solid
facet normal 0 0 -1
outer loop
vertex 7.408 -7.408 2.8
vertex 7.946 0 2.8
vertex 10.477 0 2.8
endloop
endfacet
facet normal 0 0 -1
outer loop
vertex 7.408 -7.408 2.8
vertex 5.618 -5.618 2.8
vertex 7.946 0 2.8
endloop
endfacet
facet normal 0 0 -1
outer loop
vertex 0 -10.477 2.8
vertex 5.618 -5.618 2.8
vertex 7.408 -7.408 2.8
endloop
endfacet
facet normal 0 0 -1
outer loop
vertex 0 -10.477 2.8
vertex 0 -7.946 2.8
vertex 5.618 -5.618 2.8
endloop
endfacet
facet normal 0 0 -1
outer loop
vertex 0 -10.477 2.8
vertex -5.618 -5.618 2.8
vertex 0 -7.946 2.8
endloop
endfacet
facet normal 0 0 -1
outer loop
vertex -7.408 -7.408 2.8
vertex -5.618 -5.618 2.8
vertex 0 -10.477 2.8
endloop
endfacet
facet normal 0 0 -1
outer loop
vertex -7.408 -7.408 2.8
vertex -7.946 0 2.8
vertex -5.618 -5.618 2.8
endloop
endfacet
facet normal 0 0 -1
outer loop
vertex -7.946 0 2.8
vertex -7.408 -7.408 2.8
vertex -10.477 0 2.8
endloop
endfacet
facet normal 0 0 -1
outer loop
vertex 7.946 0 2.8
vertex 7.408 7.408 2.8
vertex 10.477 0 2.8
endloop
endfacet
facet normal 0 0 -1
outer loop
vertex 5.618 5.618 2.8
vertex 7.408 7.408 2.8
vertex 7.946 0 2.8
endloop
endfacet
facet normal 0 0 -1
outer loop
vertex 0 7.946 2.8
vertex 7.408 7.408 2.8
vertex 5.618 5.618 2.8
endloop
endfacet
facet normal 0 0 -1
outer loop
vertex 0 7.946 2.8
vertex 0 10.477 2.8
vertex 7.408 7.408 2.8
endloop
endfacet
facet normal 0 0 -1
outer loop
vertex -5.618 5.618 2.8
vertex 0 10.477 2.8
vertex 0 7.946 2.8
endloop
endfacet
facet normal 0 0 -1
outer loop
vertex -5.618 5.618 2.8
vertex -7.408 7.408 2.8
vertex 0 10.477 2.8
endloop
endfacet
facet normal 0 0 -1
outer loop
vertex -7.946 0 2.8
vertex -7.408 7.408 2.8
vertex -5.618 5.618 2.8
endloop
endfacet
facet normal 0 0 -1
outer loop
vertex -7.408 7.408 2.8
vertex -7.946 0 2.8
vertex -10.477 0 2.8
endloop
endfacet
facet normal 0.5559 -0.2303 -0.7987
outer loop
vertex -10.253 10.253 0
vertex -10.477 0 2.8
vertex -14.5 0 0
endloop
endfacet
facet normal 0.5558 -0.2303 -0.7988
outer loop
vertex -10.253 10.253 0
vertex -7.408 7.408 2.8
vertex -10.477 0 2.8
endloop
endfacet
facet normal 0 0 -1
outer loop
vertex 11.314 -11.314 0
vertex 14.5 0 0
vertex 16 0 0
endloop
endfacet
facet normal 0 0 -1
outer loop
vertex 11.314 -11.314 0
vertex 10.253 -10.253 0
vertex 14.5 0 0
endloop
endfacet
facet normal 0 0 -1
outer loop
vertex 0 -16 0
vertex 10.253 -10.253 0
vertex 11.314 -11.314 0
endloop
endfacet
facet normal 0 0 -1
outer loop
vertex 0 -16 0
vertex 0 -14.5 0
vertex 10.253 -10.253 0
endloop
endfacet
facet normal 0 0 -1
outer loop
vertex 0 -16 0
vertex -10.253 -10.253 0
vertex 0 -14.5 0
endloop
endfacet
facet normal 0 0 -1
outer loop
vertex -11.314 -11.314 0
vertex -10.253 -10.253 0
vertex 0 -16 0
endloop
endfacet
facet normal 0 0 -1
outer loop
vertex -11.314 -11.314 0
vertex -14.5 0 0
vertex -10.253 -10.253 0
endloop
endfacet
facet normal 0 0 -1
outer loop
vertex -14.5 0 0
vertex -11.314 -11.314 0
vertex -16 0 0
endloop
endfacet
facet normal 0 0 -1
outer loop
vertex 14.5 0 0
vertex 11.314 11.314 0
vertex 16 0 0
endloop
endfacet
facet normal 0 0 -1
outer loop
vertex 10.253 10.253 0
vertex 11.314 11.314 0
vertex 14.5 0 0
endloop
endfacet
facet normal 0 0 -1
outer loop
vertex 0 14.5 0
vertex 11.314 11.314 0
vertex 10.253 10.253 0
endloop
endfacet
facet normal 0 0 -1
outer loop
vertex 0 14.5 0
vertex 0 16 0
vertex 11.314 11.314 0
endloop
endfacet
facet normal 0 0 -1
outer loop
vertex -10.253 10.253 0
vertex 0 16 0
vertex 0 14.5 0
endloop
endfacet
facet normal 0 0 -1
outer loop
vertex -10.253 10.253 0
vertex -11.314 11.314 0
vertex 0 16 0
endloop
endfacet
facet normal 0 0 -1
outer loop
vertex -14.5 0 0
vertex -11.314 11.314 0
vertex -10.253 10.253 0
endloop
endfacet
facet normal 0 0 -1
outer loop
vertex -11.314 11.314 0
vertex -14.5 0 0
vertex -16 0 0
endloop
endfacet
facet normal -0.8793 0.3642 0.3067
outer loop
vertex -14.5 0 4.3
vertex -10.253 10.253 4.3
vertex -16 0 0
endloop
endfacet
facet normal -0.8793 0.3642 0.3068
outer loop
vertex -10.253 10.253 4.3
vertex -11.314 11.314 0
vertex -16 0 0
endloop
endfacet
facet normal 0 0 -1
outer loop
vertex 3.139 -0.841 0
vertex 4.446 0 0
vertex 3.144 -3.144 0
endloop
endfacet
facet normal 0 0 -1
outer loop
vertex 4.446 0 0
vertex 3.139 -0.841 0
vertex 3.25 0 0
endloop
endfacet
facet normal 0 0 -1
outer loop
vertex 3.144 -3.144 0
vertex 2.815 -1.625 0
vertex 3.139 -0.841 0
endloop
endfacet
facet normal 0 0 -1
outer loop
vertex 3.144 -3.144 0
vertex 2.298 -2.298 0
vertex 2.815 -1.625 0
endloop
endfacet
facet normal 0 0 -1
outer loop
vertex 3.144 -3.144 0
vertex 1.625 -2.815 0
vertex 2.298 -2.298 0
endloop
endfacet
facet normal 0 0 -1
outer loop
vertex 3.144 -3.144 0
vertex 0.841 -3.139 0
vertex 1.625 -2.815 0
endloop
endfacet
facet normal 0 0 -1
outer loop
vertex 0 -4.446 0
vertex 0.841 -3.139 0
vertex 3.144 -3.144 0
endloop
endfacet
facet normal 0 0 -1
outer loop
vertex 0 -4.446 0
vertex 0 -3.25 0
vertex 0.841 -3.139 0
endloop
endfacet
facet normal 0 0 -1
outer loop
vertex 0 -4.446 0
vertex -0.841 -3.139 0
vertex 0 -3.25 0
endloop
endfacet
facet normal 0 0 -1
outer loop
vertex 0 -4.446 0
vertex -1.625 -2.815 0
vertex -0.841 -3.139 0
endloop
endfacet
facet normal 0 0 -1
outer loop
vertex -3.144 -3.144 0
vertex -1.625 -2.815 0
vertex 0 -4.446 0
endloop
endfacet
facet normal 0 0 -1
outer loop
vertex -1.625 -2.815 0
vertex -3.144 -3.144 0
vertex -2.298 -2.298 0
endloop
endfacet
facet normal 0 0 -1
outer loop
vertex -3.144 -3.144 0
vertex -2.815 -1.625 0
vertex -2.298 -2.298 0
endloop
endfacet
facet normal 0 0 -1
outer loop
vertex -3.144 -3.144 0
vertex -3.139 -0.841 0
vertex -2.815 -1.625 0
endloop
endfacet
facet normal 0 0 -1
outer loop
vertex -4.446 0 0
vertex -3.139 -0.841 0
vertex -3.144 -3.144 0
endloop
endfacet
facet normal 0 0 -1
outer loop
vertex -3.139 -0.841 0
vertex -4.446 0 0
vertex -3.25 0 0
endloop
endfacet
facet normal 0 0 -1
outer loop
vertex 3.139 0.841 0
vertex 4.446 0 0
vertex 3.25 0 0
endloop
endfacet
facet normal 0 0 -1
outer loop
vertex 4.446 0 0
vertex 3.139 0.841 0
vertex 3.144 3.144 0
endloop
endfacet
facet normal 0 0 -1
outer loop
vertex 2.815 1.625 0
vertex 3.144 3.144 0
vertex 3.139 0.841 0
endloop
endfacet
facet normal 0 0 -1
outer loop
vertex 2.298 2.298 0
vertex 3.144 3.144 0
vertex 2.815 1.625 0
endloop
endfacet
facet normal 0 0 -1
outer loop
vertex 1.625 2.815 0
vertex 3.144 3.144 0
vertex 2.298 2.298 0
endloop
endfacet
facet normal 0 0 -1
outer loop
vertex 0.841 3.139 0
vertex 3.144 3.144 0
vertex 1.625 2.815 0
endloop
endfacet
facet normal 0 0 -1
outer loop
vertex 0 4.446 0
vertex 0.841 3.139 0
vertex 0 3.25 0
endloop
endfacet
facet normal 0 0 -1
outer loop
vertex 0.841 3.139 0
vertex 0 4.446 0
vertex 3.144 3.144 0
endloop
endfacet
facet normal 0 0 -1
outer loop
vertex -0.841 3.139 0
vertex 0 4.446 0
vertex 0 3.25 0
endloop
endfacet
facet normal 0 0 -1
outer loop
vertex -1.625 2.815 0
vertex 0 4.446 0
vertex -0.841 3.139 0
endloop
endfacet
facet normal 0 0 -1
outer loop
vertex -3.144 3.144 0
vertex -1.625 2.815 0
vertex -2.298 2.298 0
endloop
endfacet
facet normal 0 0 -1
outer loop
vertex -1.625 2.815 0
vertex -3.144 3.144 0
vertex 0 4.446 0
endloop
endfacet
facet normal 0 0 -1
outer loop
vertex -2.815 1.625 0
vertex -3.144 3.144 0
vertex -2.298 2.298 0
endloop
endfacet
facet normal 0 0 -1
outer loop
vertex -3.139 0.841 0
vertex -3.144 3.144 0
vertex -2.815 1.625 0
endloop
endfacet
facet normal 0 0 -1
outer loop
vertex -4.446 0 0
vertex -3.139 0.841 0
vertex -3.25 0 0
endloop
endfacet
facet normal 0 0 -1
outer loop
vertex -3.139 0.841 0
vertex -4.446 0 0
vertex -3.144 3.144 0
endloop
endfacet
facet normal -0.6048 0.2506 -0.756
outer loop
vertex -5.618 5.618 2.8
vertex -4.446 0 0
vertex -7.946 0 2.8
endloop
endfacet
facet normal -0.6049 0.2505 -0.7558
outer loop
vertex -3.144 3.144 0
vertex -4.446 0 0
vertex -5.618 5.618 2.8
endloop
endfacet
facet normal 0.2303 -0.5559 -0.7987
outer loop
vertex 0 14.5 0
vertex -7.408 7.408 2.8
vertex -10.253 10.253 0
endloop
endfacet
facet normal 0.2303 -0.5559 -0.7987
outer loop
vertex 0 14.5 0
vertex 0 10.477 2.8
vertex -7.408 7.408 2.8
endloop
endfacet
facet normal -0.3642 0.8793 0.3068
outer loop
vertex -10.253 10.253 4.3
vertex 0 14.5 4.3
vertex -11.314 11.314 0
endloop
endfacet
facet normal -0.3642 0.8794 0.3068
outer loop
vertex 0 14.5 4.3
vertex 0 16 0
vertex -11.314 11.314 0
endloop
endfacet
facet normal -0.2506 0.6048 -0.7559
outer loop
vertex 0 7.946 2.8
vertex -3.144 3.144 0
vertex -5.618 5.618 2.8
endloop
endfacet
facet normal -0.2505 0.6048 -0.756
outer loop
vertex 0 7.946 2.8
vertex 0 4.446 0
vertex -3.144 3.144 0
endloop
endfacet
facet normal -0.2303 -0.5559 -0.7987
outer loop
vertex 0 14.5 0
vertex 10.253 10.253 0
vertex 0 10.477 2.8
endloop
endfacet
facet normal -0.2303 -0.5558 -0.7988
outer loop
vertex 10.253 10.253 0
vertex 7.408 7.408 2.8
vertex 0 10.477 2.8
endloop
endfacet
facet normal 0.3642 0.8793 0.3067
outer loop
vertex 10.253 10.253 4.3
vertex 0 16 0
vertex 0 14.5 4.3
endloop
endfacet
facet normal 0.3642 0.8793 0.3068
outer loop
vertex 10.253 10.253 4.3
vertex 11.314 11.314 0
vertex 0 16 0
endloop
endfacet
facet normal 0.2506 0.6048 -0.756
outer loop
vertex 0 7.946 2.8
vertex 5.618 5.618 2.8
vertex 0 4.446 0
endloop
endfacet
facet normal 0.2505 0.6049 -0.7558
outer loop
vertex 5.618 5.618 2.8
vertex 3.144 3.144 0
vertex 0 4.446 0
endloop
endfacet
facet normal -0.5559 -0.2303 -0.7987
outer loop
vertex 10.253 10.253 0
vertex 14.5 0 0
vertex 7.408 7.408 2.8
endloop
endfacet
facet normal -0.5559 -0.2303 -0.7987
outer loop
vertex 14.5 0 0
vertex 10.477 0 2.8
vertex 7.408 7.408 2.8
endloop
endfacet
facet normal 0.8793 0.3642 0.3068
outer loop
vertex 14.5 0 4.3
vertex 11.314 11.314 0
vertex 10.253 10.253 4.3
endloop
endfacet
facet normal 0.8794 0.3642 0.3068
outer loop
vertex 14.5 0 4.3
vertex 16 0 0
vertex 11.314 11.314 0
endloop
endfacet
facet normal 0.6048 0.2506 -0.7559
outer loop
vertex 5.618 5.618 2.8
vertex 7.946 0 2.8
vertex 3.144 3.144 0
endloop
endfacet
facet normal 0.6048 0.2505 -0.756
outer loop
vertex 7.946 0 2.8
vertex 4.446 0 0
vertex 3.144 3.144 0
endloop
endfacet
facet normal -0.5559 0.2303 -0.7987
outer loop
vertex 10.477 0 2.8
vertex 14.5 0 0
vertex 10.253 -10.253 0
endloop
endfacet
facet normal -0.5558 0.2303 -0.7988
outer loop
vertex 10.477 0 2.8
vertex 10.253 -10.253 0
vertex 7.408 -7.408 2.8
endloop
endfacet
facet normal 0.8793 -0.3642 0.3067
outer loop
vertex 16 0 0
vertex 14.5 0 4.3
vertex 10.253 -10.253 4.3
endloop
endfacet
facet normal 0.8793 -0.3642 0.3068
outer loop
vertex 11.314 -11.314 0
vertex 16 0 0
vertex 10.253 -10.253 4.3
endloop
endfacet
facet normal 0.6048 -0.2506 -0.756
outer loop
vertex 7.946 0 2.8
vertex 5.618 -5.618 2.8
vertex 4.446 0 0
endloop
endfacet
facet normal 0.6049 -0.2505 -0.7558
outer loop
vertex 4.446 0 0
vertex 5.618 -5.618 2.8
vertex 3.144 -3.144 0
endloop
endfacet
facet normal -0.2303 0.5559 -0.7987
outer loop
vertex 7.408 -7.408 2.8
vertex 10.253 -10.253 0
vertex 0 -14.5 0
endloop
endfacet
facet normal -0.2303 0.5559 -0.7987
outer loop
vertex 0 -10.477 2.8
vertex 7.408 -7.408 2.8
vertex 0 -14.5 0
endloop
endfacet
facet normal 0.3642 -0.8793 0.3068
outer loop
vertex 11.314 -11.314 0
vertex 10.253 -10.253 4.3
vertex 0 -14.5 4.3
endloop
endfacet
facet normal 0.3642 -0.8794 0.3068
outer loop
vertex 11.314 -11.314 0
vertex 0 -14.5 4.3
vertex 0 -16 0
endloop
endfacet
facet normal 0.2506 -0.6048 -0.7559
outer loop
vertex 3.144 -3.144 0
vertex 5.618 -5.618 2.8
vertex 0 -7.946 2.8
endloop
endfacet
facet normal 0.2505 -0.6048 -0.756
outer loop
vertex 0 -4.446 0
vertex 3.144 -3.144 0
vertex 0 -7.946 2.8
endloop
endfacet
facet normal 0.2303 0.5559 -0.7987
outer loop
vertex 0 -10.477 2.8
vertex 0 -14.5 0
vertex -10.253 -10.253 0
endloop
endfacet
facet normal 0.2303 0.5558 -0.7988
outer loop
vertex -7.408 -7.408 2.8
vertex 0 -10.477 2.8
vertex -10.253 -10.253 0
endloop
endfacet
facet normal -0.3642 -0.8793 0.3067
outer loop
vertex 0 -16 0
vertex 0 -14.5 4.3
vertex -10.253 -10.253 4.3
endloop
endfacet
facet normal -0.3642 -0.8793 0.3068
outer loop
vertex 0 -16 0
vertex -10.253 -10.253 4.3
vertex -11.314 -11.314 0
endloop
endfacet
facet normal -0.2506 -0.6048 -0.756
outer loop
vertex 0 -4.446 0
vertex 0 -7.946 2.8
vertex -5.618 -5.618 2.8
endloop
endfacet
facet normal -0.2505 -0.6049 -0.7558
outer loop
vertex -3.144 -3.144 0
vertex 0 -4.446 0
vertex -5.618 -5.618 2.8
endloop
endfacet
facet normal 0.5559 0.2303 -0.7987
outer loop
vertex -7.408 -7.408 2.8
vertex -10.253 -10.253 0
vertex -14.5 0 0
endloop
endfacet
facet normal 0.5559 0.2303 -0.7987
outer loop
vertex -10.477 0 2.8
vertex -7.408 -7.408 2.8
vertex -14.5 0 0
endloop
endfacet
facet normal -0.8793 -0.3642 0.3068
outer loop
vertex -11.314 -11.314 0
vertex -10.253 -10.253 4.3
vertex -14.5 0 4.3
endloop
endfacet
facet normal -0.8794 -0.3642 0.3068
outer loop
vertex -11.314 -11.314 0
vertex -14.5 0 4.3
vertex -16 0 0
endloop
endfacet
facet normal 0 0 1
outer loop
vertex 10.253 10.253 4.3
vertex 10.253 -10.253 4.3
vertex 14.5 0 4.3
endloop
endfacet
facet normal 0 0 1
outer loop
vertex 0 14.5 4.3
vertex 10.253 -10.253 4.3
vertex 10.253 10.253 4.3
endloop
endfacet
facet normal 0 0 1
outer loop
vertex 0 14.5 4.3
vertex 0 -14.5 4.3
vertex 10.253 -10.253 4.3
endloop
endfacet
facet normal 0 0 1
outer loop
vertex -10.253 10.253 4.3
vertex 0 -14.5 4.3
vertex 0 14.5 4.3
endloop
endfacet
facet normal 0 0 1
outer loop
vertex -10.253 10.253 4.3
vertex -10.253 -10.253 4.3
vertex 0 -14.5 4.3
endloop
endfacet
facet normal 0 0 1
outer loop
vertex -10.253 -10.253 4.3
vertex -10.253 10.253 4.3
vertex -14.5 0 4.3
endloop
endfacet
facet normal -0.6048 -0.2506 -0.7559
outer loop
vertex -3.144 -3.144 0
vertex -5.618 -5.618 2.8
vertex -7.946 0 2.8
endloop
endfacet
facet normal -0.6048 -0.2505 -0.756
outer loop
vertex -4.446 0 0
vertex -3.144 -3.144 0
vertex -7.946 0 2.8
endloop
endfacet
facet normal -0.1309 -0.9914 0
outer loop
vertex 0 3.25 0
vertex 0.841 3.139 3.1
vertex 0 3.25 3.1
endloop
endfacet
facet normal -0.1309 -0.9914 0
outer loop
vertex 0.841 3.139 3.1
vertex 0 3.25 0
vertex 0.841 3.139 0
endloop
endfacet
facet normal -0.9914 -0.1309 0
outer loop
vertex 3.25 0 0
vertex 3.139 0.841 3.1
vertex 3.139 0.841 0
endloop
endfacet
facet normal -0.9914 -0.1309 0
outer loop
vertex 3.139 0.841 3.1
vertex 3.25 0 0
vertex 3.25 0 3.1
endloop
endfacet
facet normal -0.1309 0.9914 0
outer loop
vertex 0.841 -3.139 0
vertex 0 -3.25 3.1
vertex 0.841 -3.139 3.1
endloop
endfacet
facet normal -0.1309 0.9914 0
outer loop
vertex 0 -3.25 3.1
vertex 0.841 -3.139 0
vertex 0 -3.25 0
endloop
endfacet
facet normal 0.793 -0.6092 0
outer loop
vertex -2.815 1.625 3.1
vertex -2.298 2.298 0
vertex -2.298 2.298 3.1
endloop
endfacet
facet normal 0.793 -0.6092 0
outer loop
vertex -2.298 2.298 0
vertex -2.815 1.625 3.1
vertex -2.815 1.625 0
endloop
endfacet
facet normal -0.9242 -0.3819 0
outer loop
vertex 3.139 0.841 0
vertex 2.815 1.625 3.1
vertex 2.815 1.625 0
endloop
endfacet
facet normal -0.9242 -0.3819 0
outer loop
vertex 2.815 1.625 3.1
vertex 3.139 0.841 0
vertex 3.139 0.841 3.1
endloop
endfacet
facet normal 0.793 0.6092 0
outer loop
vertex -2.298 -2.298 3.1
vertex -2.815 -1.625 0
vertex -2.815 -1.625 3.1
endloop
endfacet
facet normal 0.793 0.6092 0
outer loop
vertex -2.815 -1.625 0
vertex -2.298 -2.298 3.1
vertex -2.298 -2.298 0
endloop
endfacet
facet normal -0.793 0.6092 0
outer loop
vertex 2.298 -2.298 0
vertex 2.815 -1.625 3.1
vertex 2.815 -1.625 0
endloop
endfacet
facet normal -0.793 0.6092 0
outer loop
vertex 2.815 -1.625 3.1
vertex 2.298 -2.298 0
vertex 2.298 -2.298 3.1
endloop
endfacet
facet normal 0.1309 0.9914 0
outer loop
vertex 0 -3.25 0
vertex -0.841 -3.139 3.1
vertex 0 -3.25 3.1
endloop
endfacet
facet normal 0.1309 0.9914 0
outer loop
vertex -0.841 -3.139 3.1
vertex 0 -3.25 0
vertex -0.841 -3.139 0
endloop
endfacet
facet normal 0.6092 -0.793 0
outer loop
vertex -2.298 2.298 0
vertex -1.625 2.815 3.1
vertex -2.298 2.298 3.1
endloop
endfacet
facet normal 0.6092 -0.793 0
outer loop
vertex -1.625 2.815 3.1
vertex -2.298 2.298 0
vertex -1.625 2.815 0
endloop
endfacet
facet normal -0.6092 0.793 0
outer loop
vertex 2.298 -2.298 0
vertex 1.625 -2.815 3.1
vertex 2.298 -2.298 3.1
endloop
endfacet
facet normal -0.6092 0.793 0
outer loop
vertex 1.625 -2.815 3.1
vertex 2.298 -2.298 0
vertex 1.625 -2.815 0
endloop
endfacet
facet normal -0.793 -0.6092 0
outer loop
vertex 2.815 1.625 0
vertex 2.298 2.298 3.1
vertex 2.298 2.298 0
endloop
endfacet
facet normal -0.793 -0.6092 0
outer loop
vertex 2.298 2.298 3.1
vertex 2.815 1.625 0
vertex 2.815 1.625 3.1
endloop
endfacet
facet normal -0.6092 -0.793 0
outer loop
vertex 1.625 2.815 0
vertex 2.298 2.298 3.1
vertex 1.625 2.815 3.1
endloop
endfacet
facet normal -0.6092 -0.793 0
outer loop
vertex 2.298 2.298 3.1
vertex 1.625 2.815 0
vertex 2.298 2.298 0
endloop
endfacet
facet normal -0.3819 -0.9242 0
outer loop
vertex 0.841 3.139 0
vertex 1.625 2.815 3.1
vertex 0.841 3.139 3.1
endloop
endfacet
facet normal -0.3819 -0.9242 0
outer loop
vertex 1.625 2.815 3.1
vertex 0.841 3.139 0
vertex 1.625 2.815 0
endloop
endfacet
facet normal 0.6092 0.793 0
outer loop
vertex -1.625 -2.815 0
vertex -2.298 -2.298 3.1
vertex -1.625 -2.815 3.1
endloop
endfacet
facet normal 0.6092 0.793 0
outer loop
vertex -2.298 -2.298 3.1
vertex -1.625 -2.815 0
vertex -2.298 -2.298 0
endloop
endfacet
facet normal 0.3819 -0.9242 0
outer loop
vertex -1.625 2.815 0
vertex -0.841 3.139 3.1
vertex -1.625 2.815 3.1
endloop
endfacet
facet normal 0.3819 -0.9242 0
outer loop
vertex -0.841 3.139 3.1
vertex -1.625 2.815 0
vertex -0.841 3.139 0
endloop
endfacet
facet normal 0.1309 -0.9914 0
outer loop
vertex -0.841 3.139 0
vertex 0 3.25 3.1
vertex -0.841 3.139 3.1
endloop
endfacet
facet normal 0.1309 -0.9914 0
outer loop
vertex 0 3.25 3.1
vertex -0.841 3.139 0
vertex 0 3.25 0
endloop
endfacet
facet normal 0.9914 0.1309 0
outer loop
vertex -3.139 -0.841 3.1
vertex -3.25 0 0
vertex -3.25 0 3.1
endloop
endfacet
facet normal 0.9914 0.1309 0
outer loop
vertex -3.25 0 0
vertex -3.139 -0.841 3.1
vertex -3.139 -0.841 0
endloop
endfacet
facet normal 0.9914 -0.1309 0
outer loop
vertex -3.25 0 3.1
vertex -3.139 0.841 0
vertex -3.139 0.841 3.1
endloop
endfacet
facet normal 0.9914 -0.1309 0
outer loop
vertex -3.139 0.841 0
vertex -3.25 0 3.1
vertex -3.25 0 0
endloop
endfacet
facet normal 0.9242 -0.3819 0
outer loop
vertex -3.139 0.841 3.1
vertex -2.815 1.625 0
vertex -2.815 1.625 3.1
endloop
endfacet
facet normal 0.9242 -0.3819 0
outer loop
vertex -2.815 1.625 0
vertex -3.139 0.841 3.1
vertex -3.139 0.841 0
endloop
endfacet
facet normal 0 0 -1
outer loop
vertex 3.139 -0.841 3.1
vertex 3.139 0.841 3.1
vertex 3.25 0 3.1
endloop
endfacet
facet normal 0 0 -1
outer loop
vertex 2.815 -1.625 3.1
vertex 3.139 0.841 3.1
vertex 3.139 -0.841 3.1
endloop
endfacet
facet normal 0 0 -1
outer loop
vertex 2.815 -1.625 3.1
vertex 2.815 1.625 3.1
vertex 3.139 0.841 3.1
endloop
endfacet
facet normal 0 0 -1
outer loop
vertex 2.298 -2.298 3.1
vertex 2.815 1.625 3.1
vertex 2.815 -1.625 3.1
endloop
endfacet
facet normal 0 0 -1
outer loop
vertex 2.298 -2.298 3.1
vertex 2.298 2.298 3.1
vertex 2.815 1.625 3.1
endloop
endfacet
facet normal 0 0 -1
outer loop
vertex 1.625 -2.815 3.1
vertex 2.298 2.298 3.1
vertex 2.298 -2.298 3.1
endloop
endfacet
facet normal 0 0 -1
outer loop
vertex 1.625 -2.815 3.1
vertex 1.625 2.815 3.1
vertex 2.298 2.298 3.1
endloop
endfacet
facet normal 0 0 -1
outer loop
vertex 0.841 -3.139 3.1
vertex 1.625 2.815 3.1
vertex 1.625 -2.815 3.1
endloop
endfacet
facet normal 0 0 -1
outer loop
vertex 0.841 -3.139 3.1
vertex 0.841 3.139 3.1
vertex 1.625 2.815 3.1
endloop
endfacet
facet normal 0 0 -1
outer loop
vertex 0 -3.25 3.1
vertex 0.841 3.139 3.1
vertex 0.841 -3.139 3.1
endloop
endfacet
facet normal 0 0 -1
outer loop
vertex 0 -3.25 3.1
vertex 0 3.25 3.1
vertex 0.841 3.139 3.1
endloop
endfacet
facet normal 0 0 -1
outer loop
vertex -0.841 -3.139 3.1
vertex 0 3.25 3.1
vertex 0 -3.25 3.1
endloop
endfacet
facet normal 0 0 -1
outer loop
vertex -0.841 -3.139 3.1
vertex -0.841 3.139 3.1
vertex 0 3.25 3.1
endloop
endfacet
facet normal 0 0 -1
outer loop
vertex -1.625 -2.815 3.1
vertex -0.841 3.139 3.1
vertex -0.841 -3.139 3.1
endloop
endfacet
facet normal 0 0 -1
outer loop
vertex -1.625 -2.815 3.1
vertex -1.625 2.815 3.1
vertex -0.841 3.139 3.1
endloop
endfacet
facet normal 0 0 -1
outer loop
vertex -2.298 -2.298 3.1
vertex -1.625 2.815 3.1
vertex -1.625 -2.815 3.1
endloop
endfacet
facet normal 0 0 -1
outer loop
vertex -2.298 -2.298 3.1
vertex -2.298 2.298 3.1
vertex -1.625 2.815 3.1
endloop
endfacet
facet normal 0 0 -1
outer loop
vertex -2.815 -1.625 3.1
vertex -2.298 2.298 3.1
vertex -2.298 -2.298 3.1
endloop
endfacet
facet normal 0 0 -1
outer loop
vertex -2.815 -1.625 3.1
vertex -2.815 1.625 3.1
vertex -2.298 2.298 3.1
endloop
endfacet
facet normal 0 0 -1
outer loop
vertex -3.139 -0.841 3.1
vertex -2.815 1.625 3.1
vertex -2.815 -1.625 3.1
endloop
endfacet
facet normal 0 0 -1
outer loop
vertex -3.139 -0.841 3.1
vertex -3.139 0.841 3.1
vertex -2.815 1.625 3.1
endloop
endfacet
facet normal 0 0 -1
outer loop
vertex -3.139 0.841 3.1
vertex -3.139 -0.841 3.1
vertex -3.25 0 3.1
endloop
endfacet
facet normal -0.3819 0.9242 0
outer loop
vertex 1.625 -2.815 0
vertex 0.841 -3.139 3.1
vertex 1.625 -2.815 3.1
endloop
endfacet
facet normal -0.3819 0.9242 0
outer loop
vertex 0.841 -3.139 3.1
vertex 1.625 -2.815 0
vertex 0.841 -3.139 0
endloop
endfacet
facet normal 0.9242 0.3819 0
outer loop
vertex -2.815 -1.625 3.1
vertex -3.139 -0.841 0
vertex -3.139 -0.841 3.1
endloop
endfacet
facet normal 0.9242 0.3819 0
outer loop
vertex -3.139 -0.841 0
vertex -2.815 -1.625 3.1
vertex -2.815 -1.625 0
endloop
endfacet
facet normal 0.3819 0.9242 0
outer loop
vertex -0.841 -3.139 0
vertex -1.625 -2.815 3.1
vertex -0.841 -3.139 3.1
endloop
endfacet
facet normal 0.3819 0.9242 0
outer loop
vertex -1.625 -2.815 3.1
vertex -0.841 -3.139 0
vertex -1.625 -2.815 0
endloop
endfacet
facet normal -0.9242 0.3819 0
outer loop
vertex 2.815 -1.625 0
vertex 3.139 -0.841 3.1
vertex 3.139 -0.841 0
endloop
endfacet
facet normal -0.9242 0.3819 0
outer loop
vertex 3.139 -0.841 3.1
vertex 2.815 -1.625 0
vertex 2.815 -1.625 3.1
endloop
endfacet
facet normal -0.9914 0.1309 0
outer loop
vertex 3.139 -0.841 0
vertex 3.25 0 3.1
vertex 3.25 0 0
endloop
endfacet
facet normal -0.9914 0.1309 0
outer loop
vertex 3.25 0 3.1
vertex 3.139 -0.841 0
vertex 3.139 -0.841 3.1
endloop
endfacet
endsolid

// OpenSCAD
// file: girl_common.scad
// Copyright 2025 Natalie Baker // Apache v2 //

// // Settings // //

tile_tol   = 0.5; 
base_size  = 32;
base_scale = base_size + 2 - tile_tol;
wall_width =   8;

// // Magnets // //

magnet_dia    = 6.2;
magnet_height = 2.8;

// // Lock // //

lock_height   = 1.9;
lock_depth    = 4.9;
lock_shoulder = 2.0;
lock_width    = 11; 

// // Grid // //

grid_key_width = 1.8;

grid_tile_size =  base_scale + 2*wall_width;
grid_tile_diag   = sqrt(2*grid_tile_size*grid_tile_size);

grid_base_size   = grid_tile_size + tile_tol;
grid_base_diag   = sqrt(2*grid_base_size*grid_base_size);
grid_base_height = max(lock_height, magnet_height)+1.2;

// // Tile // //

tile_height        = grid_base_height;
tile_top_thickness = tile_height-magnet_height;

// // Frame // //

frame_size = lock_depth;

// // Util // //

module mirror_copy(m) {
	mirror(m) children();
	children();	
}

module rotate_copy(a) {
	rotate(a) children();
	children();	
}

module repeat(size, x, y, z, center) {
	off = center 
		? [(x-1)*size[0],(y-1)*size[1],(z-1)*size[2]]/2 
		: [0,0,0];

	for(i = [0 : x-1])
	for(j = [0 : y-1])
	for(k = [0 : z-1])
		translate([
			size[0]*i-off[0],
			size[1]*j-off[1],
			size[2]*k-off[2]
		]) children();
}
// main file
// Copyright 2025 Natalie Baker // Apache v2 //

include<girl_common.scad>;

base_thickness = 1.5;
base_gap       = magnet_height;

base_rad     = base_size/2;
base_rad_top = base_rad - 1.5;
base_rad_in  = base_rad_top+(base_rad-base_rad_top)*(base_gap/(base_thickness+base_gap));
 
girl_mini_base();

module girl_mini_base() {
	$fn=24;
	difference() {
		_girl_mini_base_part();
		_girl_mini_base_magnet_hole();
	}
}

module _girl_mini_base_part() {
	magnet_offset = (magnet_dia/2+base_thickness/2) / (sqrt(3)/2);
	rotate_extrude($fn=8)
	polygon([ 
		[              base_rad,                          0],
		[          base_rad_top,    base_thickness+base_gap],
		[                     0,    base_thickness+base_gap],
		[                     0,                          0],
		[         magnet_offset,                          0],
		[1.25*base_gap+magnet_offset,              base_gap],
		[base_rad_in-base_thickness-base_gap*1.25, base_gap],
		[base_rad   -base_thickness,                      0],
	]);
}

module _girl_mini_base_magnet_hole(tolerance=0.15) {
	mad_d = magnet_dia+2*tolerance;
	mag_h = magnet_height+2*tolerance;
	
	translate([0,0,-0.05])
	cylinder(d=mad_d, h=mag_h+0.05);
}
